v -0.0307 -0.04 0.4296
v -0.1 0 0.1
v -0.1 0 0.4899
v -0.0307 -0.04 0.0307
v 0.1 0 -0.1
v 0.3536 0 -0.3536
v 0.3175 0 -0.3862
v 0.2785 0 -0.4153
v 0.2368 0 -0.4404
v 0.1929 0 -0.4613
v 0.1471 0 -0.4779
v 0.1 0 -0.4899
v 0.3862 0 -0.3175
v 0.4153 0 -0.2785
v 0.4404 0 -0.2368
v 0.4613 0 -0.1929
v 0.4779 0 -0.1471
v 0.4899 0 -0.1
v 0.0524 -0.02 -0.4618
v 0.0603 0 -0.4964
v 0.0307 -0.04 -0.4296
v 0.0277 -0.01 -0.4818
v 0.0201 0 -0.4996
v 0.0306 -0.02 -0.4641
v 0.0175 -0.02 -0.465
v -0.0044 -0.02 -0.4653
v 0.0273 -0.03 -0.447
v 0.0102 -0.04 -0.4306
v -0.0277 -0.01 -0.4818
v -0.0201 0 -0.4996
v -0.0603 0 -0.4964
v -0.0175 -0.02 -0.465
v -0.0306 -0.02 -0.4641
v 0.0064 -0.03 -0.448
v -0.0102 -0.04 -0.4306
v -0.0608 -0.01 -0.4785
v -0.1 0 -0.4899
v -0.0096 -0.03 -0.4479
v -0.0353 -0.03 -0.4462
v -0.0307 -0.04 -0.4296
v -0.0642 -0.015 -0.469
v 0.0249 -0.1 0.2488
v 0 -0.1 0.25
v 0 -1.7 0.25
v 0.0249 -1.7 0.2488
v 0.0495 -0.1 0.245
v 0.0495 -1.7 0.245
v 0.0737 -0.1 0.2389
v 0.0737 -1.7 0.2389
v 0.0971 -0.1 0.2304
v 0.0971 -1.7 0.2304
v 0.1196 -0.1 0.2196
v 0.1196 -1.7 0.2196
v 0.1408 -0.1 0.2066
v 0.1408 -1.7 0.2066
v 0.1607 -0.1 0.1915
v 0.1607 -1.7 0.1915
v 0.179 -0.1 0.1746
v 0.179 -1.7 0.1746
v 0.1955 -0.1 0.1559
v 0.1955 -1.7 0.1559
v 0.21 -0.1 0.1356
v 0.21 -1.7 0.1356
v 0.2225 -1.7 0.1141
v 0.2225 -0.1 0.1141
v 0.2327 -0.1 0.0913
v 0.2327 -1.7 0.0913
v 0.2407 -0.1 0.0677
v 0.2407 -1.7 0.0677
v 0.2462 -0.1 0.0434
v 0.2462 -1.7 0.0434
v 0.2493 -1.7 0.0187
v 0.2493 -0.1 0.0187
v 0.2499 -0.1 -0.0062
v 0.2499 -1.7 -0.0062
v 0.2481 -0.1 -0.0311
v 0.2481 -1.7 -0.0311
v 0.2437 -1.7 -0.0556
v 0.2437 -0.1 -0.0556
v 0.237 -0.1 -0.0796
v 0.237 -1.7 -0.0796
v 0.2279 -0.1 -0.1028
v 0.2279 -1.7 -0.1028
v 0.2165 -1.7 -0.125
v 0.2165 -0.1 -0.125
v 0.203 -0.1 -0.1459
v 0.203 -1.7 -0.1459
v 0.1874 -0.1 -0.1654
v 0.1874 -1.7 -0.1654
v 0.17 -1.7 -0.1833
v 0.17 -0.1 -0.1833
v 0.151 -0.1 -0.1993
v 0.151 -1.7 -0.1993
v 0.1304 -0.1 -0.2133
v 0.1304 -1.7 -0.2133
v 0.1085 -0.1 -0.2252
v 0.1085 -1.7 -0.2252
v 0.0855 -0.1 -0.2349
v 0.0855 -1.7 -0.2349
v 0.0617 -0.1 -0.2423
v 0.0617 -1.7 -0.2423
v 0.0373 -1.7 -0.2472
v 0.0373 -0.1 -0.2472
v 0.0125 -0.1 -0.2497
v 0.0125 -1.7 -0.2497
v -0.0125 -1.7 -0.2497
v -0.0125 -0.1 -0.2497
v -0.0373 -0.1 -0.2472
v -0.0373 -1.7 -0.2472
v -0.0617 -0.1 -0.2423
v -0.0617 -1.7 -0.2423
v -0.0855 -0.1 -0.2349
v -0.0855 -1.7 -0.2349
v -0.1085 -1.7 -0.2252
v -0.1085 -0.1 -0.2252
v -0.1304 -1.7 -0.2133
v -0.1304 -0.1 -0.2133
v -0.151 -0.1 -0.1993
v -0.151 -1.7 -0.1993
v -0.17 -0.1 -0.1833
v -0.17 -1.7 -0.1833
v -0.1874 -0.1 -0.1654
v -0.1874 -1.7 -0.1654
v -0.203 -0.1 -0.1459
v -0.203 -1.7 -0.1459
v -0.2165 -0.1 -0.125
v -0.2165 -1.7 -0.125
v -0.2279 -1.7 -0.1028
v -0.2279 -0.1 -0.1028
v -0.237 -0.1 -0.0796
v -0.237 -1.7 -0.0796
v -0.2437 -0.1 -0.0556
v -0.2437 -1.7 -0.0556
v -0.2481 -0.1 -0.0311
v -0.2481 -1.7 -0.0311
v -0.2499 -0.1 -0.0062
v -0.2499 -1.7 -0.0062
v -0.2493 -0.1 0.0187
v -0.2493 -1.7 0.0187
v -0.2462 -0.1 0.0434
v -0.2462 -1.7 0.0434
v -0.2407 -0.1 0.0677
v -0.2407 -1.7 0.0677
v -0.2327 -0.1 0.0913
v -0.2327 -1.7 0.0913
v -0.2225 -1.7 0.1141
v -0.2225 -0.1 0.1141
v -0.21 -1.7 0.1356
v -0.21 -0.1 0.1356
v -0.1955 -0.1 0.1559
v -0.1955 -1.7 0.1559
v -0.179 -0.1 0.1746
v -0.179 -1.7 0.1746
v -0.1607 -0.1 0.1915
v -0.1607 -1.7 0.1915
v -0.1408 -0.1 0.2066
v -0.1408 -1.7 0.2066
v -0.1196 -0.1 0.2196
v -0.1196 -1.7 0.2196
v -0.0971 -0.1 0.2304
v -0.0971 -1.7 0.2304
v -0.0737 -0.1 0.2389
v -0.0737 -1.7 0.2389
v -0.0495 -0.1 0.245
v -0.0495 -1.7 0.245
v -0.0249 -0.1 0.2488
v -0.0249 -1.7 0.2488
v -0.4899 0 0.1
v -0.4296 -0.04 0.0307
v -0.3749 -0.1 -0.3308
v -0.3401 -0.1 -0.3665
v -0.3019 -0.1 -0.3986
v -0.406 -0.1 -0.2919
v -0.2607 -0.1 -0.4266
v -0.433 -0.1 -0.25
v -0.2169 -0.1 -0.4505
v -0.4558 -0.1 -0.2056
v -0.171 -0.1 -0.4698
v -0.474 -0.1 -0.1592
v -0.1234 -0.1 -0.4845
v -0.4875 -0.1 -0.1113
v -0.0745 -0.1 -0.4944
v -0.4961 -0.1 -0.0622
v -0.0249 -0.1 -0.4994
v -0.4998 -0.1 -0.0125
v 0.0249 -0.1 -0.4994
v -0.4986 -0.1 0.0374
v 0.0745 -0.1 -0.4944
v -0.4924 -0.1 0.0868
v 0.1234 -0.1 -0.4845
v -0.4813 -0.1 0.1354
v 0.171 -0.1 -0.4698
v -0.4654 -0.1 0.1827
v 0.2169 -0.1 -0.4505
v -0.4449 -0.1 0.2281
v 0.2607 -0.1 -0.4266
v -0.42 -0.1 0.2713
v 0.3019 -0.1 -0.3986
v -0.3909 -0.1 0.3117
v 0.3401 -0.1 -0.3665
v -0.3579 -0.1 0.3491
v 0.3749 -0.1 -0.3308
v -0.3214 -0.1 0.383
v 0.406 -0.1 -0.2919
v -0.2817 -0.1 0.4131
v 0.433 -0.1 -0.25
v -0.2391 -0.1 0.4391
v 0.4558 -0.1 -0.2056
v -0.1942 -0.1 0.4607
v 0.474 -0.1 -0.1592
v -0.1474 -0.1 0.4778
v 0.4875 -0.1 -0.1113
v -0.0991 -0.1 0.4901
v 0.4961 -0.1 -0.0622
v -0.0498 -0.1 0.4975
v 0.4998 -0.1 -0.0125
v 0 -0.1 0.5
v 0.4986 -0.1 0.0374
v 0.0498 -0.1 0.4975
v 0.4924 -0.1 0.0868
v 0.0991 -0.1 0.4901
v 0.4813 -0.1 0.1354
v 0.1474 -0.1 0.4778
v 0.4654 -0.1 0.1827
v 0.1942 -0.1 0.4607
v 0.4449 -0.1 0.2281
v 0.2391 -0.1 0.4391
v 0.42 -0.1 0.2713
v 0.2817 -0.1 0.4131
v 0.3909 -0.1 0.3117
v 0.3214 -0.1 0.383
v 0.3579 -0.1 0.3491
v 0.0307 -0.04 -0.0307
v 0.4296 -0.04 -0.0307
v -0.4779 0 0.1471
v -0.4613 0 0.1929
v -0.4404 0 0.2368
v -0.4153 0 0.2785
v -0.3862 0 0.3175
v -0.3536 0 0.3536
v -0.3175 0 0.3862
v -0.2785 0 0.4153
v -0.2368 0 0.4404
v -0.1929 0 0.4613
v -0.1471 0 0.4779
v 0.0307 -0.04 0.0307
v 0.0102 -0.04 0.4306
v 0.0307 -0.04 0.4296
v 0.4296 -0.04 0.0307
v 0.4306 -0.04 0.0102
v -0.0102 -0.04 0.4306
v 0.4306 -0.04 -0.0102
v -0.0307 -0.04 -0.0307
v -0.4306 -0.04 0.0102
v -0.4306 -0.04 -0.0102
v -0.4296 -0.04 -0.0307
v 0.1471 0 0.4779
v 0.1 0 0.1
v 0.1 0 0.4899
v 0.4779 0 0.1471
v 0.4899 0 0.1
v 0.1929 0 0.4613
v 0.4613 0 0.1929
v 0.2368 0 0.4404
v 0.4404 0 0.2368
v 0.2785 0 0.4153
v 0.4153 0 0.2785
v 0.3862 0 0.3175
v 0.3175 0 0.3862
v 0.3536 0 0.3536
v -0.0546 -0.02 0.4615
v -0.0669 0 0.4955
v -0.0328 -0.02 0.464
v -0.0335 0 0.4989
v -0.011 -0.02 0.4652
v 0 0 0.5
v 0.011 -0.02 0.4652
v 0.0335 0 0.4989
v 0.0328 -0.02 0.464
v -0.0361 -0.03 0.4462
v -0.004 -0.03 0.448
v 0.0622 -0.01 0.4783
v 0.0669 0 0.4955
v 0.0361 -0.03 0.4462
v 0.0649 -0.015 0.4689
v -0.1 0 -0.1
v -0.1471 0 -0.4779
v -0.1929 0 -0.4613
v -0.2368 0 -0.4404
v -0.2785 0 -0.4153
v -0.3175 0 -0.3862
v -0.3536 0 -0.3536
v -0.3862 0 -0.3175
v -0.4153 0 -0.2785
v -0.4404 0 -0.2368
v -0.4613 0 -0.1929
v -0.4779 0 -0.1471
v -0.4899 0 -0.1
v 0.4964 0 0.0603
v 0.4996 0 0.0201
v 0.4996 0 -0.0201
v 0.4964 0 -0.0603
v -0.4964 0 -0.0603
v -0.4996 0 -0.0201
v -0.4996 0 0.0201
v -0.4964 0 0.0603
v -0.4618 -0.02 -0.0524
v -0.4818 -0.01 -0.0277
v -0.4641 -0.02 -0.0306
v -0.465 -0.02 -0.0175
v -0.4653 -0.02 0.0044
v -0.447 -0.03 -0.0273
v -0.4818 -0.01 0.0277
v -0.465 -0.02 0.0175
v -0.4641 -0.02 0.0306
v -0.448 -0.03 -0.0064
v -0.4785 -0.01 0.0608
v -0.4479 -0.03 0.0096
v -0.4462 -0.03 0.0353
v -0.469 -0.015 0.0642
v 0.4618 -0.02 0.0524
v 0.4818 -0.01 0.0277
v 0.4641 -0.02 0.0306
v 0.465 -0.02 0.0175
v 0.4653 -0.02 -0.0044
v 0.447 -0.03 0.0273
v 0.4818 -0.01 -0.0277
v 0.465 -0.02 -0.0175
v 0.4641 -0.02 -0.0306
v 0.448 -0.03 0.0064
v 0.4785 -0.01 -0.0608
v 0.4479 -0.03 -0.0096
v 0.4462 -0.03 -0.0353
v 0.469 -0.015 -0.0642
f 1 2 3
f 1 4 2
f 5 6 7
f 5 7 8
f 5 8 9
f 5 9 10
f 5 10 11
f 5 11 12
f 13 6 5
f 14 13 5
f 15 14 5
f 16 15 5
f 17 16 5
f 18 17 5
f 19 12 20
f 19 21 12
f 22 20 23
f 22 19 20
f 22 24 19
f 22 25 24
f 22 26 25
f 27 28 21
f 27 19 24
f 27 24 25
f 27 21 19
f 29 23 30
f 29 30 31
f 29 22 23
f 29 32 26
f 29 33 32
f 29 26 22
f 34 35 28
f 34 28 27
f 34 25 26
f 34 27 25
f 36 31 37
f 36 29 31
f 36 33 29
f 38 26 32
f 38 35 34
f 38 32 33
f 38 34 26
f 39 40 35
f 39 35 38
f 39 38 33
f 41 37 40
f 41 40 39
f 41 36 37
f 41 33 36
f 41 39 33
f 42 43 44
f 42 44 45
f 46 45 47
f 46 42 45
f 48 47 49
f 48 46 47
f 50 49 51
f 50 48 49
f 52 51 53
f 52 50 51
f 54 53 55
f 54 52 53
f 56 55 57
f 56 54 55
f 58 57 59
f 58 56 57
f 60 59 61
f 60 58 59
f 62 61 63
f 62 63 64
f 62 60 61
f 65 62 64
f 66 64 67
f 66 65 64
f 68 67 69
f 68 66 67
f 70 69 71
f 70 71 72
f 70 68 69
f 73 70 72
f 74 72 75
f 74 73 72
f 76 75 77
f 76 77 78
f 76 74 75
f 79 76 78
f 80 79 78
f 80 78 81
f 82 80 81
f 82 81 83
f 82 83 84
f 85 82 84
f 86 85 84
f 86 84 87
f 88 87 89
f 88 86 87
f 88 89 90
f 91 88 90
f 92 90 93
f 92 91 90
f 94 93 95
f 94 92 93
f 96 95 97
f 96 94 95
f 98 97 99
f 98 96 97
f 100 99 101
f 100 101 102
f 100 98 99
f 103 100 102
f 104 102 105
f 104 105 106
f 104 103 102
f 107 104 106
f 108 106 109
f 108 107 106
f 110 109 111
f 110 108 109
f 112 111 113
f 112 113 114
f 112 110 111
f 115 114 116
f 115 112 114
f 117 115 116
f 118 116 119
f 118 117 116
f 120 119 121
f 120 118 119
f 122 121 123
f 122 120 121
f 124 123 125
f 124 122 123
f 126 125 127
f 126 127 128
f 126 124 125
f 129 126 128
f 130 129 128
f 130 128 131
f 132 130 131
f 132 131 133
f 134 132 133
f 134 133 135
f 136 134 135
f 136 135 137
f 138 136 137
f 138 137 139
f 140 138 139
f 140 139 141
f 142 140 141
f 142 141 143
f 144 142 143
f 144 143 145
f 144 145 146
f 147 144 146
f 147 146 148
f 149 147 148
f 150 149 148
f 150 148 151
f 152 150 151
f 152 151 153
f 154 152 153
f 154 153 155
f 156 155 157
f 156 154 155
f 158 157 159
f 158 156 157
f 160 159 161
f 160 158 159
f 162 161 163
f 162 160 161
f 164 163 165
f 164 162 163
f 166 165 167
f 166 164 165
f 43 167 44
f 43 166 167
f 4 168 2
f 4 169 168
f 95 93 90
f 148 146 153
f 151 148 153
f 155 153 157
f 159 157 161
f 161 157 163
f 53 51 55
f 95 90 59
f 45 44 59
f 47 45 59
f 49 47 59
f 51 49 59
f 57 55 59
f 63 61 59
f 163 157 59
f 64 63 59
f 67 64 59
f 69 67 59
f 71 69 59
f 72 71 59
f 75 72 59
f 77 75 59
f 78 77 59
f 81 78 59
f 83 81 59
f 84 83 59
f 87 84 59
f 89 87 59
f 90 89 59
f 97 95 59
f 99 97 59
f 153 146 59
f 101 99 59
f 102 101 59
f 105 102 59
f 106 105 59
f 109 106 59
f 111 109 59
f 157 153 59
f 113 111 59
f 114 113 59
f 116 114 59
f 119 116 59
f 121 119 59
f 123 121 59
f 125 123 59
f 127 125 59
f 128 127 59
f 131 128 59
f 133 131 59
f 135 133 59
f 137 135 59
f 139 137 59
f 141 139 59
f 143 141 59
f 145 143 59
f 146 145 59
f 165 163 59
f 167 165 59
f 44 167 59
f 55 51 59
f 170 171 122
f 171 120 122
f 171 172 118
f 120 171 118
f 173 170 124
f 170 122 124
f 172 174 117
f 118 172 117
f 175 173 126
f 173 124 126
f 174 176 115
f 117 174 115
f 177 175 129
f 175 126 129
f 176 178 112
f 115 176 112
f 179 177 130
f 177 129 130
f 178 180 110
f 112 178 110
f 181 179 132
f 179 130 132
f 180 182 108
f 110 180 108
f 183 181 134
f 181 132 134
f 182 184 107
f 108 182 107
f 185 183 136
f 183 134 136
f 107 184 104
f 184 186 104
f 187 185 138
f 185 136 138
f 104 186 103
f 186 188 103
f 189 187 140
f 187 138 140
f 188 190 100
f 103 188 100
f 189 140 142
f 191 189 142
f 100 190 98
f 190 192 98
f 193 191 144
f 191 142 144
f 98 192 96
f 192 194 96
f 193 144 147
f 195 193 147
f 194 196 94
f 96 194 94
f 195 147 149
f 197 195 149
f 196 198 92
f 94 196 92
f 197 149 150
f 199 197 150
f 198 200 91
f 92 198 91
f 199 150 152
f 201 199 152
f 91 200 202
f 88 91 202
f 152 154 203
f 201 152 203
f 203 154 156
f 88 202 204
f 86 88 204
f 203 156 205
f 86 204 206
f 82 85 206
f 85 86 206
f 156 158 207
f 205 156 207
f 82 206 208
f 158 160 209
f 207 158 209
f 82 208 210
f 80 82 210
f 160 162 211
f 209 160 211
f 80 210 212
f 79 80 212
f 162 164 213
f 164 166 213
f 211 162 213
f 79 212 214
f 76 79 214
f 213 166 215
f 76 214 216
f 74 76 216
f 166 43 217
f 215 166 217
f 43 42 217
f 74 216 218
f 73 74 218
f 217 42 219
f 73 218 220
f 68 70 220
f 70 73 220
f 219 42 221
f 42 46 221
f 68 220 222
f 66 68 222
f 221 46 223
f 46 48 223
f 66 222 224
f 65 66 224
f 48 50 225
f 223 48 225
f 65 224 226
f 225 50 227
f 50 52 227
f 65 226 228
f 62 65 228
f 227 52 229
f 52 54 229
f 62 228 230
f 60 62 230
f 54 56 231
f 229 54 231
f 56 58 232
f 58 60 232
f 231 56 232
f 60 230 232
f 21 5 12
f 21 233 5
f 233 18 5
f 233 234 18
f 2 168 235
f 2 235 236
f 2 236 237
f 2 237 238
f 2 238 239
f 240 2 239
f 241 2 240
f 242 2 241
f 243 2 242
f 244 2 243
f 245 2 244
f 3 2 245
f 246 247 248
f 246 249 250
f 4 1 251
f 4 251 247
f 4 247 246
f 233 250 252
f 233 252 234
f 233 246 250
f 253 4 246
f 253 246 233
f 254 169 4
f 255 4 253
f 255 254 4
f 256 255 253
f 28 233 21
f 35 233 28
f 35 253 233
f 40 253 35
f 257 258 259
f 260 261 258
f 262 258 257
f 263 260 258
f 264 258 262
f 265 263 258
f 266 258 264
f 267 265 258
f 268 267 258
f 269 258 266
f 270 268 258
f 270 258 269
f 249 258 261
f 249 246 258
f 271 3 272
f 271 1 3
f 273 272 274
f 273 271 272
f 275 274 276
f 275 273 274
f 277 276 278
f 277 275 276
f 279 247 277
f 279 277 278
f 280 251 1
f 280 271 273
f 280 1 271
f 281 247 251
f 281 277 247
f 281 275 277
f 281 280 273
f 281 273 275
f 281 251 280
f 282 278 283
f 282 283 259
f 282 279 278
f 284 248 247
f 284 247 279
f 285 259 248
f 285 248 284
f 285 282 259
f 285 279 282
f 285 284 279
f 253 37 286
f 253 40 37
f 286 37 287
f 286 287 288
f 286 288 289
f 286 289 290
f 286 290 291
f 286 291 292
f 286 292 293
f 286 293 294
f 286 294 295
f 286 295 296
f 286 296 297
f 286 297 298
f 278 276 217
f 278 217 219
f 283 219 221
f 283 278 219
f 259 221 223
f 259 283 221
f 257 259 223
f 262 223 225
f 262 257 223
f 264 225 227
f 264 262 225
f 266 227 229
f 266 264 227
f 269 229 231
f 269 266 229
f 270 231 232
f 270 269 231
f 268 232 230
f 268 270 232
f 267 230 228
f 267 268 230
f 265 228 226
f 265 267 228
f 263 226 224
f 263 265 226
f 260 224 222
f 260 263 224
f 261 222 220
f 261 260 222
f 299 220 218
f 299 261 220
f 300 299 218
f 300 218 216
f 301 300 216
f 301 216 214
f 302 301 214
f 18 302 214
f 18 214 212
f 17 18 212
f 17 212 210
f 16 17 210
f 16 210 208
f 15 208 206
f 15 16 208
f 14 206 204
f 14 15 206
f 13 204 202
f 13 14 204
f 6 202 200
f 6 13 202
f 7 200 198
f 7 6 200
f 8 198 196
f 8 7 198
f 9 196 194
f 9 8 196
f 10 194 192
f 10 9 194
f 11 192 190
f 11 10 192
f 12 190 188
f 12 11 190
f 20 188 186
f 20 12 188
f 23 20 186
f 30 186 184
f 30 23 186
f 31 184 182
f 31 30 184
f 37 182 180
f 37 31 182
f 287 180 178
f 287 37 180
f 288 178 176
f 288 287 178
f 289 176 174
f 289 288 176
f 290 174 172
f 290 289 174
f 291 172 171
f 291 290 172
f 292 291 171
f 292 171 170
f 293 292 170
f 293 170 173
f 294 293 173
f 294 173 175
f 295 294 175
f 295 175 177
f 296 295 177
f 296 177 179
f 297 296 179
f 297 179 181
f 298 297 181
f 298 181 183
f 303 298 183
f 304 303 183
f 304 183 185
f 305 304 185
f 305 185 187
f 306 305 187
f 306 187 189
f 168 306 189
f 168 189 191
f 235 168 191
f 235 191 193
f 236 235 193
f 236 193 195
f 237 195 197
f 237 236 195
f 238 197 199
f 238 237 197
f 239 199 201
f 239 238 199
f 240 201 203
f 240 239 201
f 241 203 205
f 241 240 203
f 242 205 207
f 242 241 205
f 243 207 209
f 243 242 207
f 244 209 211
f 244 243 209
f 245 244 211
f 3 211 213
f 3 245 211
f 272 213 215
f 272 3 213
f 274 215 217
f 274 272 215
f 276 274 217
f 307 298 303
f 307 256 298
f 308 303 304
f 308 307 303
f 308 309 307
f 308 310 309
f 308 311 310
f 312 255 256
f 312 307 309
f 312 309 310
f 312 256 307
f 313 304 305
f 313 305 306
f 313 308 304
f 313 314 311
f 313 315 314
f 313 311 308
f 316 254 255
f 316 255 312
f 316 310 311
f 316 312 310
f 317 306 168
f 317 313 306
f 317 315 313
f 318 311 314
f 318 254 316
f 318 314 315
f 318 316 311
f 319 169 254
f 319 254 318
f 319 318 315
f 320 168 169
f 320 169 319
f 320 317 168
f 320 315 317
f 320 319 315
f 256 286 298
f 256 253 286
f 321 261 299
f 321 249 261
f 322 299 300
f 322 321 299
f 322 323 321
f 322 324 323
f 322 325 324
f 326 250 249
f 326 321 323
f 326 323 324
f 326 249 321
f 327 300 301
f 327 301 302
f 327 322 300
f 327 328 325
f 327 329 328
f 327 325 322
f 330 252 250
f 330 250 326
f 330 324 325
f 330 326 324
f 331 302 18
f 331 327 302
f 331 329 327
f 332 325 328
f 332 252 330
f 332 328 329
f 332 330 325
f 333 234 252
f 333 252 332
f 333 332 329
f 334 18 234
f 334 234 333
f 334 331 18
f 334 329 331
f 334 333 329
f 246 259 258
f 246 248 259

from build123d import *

# Parameters (mm, degrees)
SKETCH1_R           = 0.5
BOSS_EXTRUDE1_DEPTH = 0.1
BOSS_EXTRUDE2_START = -0.1
SKETCH1_3_R         = 0.25
BOSS_EXTRUDE2_DEPTH = 1.6
CUT_EXTRUDE1_DEPTH  = 0.04
CUT_EXTRUDE1_TAPER  = 60


with BuildPart() as part:
    # Sketch1 → Boss-Extrude1 (new body)
    with BuildSketch(Plane(origin=(0, 0, 0), x_dir=(1, 0, 0), z_dir=(0, 1, 0))):
        with Locations(Location((0, 0, 0), (0, 0, 270))):
            Circle(SKETCH1_R)
    extrude(amount=-BOSS_EXTRUDE1_DEPTH)

    # Sketch1<3> → Boss-Extrude2 (add)
    with BuildSketch(Plane(origin=(0, 0, 0), x_dir=(1, 0, 0), z_dir=(0, 1, 0)).offset(BOSS_EXTRUDE2_START)):
        with Locations(Location((0, 0, 0), (0, 0, 270))):
            Circle(SKETCH1_3_R)
    extrude(amount=-BOSS_EXTRUDE2_DEPTH)

    # Sketch2 → Cut-Extrude1 (cut)
    with BuildSketch(Plane(origin=(0, 0, 0), x_dir=(1, 0, 0), z_dir=(0, 1, 0))):
        with BuildLine():
            ThreePointArc((0.1, 0.489897949), (0, 0.5), (-0.1, 0.489897949))
            Line((-0.1, 0.489897949), (-0.1, 0.1))
            Line((-0.1, 0.1), (-0.489897949, 0.1))
            ThreePointArc((-0.489897949, 0.1), (-0.5, 0), (-0.489897949, -0.1))
            Line((-0.489897949, -0.1), (-0.1, -0.1))
            Line((-0.1, -0.1), (-0.1, -0.489897949))
            ThreePointArc((-0.1, -0.489897949), (0, -0.5), (0.1, -0.489897949))
            Line((0.1, -0.489897949), (0.1, -0.1))
            Line((0.1, -0.1), (0.489897949, -0.1))
            ThreePointArc((0.489897949, -0.1), (0.5, 0), (0.489897949, 0.1))
            Line((0.489897949, 0.1), (0.1, 0.1))
            Line((0.1, 0.1), (0.1, 0.489897949))
        make_face()
    extrude(amount=-CUT_EXTRUDE1_DEPTH, taper=CUT_EXTRUDE1_TAPER, mode=Mode.SUBTRACT)


solid = part.part
